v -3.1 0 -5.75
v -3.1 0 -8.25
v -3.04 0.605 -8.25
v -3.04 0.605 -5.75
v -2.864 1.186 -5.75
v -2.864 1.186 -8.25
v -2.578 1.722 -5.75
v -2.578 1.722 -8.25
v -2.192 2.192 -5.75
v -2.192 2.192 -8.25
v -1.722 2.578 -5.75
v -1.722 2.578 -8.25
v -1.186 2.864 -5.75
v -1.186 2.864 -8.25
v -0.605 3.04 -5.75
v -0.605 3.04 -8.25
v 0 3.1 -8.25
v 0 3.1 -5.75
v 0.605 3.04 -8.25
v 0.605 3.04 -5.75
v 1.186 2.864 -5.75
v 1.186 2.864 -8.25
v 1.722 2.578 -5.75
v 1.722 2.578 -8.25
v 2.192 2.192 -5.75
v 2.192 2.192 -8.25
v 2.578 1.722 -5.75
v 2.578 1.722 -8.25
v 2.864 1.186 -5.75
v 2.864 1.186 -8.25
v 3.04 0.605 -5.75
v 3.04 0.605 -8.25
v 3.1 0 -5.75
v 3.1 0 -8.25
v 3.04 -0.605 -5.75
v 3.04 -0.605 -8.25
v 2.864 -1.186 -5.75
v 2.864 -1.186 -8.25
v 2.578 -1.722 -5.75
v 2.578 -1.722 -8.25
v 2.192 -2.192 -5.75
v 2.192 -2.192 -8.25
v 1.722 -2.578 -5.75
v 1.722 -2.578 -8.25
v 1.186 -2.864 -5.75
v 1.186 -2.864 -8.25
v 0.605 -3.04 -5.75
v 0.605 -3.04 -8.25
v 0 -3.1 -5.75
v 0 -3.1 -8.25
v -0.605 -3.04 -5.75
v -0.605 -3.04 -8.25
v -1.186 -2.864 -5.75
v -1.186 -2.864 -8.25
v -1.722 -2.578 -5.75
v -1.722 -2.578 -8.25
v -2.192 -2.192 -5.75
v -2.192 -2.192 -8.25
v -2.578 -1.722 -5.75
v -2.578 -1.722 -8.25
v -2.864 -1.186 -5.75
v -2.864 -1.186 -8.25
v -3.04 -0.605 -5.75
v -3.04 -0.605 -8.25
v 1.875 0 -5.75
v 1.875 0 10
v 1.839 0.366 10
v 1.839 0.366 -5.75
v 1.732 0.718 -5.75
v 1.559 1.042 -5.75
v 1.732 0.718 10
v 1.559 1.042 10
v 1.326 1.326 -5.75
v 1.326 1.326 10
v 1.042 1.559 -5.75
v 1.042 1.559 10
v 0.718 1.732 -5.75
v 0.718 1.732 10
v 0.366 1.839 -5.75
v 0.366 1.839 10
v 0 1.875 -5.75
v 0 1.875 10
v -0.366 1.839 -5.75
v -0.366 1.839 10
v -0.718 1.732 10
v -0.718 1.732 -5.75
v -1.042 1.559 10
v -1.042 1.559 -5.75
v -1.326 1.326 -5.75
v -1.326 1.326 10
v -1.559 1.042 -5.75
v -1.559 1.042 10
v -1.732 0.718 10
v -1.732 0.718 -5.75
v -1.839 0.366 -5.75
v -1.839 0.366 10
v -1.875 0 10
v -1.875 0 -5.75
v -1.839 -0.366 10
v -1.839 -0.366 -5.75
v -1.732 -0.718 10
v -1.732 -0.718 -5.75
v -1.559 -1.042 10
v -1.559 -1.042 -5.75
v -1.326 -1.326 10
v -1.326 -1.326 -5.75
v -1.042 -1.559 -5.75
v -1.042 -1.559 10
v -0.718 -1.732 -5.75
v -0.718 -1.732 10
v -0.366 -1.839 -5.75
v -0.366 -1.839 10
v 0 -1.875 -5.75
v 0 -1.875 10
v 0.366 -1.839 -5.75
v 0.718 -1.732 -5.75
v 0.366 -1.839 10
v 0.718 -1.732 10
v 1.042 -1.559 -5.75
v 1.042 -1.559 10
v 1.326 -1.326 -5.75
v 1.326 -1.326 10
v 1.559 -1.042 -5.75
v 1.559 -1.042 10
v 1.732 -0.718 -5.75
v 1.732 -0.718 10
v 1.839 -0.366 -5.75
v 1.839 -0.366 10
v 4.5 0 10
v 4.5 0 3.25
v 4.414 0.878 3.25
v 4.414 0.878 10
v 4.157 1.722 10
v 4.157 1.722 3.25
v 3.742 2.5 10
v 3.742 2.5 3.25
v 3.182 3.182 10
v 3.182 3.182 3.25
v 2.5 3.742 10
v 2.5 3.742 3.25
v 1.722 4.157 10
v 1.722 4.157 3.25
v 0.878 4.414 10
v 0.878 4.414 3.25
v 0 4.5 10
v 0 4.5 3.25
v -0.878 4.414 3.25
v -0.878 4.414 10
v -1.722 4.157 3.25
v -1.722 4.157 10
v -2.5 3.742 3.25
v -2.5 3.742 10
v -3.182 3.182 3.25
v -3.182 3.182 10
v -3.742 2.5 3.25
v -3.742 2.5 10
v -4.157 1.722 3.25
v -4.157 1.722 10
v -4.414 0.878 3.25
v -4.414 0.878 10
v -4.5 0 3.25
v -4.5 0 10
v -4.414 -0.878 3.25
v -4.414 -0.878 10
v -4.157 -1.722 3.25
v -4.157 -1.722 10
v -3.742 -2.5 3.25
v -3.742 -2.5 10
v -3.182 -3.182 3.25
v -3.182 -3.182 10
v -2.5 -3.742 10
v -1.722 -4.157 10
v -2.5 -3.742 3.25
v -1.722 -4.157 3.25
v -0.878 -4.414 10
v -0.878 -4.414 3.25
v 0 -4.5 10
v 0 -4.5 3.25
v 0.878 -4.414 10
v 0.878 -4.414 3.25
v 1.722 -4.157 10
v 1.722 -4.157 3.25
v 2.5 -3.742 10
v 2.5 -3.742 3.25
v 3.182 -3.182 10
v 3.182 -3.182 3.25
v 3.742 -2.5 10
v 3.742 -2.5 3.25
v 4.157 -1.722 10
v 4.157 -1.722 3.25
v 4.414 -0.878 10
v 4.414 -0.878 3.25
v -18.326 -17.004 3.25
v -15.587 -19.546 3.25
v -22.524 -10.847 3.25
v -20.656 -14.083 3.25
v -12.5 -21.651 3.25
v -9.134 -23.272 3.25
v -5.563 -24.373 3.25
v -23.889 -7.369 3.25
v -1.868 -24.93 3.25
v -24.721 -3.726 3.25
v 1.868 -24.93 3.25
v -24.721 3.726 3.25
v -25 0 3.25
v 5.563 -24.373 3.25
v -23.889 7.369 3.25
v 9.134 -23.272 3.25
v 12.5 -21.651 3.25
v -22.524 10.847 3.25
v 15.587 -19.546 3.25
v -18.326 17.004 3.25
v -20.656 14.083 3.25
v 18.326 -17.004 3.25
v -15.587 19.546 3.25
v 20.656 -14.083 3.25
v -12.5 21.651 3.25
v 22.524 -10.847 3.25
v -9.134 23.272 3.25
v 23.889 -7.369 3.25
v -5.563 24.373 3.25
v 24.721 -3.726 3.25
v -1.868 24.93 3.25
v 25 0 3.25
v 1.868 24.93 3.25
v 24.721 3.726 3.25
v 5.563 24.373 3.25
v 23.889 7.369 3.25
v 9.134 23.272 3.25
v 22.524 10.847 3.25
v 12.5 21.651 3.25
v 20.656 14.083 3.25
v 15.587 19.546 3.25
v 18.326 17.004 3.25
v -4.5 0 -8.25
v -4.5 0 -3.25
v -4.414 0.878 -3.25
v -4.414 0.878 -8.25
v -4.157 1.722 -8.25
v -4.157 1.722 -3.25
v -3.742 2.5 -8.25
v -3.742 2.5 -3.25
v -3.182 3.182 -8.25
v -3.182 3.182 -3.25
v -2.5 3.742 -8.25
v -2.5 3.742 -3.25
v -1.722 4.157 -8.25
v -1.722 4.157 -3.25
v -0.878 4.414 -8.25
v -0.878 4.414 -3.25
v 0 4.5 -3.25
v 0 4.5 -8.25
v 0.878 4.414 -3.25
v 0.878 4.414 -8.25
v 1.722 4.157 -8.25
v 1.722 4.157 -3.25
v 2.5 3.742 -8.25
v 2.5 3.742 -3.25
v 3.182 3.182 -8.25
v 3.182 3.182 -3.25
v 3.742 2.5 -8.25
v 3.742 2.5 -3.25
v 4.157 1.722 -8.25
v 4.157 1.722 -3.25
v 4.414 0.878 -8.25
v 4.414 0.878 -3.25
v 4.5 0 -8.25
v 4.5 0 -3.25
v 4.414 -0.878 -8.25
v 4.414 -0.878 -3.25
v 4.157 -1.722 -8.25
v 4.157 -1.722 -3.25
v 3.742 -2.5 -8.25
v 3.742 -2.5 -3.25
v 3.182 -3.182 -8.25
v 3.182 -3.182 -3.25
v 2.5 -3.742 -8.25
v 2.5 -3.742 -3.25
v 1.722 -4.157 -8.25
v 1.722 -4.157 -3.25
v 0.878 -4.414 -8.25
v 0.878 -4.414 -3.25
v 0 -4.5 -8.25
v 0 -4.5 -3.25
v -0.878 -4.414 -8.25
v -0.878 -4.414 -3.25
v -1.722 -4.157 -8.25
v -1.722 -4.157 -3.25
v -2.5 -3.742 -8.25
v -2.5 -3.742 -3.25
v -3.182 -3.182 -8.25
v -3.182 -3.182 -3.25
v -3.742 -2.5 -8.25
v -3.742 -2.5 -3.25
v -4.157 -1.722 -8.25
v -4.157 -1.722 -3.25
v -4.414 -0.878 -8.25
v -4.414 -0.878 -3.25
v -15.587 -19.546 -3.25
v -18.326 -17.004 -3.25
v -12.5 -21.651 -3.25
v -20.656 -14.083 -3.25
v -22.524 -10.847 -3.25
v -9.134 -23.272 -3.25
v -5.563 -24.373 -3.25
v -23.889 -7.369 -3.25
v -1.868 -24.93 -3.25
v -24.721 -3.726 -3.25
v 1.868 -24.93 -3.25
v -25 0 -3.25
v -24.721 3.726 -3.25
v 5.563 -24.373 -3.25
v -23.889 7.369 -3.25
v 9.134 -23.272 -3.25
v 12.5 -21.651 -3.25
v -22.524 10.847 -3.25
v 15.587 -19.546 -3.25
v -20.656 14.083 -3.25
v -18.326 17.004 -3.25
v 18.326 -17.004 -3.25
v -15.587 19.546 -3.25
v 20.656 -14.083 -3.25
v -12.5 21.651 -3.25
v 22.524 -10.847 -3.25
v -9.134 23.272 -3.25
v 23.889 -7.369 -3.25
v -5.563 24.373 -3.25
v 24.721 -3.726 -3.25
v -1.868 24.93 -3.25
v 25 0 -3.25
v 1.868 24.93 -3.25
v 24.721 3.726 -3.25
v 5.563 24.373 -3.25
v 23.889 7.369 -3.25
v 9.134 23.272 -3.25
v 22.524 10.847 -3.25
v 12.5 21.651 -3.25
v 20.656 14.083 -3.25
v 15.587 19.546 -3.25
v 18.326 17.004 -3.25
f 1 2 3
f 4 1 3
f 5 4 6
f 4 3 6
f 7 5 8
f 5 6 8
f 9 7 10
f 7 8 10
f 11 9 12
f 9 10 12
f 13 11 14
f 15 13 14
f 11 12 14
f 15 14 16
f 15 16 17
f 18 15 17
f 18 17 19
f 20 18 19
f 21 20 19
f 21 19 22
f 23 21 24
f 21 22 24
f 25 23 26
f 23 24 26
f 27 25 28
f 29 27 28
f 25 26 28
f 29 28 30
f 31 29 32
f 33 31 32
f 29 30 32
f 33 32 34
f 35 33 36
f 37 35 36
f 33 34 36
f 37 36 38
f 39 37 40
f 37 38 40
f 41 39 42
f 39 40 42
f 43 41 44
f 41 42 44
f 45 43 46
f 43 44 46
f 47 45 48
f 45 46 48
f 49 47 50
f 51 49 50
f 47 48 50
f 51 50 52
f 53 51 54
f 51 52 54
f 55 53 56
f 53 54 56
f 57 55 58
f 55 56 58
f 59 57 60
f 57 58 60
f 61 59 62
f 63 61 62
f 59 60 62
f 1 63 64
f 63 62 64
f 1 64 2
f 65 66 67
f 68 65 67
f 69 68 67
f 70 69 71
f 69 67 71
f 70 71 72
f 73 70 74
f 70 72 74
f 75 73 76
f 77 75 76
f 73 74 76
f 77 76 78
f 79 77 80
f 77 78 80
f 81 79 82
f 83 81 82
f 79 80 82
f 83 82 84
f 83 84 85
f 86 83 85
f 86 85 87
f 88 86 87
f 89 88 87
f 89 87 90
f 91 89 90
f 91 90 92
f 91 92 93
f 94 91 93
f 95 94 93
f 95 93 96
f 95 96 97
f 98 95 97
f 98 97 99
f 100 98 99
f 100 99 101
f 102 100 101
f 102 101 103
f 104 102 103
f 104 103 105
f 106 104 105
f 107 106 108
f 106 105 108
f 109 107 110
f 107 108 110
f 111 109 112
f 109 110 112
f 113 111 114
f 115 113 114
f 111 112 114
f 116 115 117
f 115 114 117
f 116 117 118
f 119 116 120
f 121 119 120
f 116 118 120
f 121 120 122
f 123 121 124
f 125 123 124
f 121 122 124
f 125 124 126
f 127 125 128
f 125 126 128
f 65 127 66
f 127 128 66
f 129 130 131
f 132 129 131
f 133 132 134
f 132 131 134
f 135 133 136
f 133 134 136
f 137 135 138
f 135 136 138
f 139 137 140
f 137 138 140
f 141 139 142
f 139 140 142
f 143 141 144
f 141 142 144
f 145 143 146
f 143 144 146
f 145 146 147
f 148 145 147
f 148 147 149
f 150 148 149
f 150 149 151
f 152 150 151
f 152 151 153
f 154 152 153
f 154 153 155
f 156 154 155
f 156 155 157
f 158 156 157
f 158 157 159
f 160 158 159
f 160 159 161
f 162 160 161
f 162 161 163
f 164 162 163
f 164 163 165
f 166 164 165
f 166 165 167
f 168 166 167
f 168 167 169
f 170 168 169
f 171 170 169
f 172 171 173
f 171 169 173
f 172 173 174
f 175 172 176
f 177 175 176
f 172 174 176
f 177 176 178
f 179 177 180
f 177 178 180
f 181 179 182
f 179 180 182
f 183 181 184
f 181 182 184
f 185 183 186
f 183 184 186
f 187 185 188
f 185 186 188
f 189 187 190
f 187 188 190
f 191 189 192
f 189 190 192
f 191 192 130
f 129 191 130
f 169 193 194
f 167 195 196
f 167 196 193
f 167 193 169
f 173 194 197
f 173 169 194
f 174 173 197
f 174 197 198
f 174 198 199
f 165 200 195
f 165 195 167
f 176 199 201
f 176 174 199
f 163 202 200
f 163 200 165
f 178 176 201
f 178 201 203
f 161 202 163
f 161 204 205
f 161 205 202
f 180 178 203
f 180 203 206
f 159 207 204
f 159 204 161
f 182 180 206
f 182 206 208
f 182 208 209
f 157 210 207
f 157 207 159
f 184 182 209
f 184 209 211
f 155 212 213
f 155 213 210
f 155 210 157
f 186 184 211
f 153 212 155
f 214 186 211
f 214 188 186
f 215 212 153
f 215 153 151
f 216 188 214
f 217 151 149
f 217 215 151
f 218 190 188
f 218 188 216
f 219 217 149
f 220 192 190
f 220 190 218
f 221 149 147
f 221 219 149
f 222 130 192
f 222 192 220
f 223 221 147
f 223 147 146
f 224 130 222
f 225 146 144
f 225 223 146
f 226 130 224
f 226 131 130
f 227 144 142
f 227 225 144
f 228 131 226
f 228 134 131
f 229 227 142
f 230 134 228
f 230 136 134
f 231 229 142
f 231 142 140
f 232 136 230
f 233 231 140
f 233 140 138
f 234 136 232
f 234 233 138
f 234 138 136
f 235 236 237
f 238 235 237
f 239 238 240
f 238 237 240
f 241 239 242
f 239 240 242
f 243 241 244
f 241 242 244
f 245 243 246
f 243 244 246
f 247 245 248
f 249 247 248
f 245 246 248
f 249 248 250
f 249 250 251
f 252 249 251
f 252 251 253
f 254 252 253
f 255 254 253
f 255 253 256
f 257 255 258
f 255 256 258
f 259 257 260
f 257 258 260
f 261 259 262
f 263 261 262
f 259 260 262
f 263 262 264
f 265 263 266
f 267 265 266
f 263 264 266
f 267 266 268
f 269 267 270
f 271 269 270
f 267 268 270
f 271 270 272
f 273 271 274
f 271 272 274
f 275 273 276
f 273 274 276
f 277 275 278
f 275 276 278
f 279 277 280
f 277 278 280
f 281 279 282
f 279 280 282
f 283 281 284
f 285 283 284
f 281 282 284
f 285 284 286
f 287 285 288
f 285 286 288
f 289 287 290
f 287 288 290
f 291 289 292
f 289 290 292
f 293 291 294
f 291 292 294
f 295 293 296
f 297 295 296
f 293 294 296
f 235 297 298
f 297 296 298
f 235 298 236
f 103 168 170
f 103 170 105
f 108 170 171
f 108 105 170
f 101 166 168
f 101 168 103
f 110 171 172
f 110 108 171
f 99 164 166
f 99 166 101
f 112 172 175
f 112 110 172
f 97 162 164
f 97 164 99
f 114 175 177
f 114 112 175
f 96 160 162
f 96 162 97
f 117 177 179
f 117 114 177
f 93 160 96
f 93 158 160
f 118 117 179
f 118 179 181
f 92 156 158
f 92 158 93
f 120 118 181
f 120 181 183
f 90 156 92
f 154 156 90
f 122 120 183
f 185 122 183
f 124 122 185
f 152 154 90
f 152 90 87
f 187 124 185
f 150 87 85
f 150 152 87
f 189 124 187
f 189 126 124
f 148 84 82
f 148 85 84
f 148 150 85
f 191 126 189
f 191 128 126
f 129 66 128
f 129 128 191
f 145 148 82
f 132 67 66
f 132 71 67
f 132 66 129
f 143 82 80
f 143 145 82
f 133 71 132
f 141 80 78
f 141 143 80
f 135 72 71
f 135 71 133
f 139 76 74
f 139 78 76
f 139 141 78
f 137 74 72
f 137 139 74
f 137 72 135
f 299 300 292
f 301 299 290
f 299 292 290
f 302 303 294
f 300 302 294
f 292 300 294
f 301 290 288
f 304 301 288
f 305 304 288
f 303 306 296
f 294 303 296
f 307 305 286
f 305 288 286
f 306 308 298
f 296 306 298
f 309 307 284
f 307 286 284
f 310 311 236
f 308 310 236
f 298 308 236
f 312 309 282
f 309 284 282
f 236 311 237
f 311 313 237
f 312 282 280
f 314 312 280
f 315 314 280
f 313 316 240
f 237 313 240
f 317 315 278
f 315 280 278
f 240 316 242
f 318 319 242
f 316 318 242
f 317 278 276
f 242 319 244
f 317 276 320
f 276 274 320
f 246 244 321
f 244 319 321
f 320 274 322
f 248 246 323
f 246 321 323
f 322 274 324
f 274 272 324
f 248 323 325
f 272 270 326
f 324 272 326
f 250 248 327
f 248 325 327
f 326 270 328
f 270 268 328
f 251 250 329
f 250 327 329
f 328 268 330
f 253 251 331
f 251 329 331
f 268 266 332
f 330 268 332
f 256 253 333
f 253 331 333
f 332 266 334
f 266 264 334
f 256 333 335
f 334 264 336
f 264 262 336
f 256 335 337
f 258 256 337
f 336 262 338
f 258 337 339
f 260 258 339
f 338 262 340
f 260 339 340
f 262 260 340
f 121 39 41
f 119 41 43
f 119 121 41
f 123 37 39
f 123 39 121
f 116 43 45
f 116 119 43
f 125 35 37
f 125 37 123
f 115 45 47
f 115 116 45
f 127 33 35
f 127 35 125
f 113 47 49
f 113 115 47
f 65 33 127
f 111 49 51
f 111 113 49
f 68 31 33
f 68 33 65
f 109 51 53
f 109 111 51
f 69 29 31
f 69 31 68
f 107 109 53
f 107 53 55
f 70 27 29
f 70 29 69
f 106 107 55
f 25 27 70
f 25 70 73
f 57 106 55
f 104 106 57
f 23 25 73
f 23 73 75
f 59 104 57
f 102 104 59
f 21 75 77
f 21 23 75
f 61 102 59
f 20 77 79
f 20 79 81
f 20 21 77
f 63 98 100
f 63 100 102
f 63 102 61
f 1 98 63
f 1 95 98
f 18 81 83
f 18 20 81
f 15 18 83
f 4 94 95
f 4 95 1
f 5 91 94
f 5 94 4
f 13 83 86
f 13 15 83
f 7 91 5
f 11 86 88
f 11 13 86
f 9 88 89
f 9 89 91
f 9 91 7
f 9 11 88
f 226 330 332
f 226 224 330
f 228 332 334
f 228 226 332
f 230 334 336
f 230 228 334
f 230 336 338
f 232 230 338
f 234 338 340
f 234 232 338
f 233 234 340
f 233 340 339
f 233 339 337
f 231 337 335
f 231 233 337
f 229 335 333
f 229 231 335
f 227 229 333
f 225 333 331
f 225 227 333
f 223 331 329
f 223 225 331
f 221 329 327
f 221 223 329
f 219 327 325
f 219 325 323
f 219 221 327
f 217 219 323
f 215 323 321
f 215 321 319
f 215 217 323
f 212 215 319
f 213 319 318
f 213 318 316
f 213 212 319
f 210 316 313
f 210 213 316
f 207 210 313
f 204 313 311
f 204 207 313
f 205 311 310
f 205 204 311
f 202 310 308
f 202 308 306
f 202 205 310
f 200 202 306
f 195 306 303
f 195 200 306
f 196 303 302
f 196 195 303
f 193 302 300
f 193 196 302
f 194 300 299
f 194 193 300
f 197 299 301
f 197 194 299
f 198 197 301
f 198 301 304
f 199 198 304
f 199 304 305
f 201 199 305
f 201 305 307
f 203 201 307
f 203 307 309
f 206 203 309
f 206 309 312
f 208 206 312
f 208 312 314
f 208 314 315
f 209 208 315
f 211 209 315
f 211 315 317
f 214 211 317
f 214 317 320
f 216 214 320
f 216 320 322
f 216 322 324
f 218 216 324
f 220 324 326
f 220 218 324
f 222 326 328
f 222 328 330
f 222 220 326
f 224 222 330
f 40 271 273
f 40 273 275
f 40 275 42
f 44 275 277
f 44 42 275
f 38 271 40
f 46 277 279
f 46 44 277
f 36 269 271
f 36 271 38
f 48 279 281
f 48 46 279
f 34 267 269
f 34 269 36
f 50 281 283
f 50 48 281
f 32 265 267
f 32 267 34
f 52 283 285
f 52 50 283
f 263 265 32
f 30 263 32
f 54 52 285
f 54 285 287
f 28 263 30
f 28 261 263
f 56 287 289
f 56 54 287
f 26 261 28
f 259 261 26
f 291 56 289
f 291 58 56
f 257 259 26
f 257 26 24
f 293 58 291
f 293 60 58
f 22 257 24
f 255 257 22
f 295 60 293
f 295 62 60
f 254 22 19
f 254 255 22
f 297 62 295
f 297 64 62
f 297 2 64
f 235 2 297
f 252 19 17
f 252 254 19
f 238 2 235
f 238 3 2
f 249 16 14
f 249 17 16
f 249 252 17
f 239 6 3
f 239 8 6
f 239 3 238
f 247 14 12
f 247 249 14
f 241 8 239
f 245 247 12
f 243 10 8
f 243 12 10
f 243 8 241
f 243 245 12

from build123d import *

# Parameters (mm, degrees)
SKETCH1_R               = 25
BOSS_EXTRUDE2_DEPTH     = 3.25
SKETCH2_R               = 4.5
BOSS_EXTRUDE3_DEPTH     = 10
SKETCH3_R               = 4.5
BOSS_EXTRUDE4_DEPTH     = 5
SKETCH4_R               = 3.1
CUT_EXTRUDE1_DEPTH      = 2.5
SKETCH6_R               = 1.875
CUT_EXTRUDE2_DEPTH      = 1
CUT_EXTRUDE2_DEPTH_BACK = 19.25


with BuildPart() as part:
    # Sketch1 → Boss-Extrude2 (new body, symmetric)
    with BuildSketch(Plane.XY):
        Circle(SKETCH1_R)
    extrude(amount=BOSS_EXTRUDE2_DEPTH, both=True)

    # Sketch2 → Boss-Extrude3 (add)
    with BuildSketch(Plane.XY):
        Circle(SKETCH2_R)
    extrude(amount=BOSS_EXTRUDE3_DEPTH)

    # Sketch3 → Boss-Extrude4 (add)
    with BuildSketch(Plane(origin=(0, 0, -3.25), x_dir=(-1, 0, 0), z_dir=(0, 0, -1))):
        Circle(SKETCH3_R)
    extrude(amount=BOSS_EXTRUDE4_DEPTH)

    # Sketch4 → Cut-Extrude1 (cut)
    with BuildSketch(Plane(origin=(0, 0, -8.25), x_dir=(-1, 0, 0), z_dir=(0, 0, -1))):
        Circle(SKETCH4_R)
    extrude(amount=-CUT_EXTRUDE1_DEPTH, mode=Mode.SUBTRACT)

    # Sketch6 → Cut-Extrude2 (cut, two sides)
    with BuildSketch(Plane.XY.offset(10)) as cut_extrude2_sk:
        Circle(SKETCH6_R)
    extrude(amount=CUT_EXTRUDE2_DEPTH, mode=Mode.SUBTRACT)
    extrude(cut_extrude2_sk.sketch, amount=-CUT_EXTRUDE2_DEPTH_BACK, mode=Mode.SUBTRACT)


solid = part.part
